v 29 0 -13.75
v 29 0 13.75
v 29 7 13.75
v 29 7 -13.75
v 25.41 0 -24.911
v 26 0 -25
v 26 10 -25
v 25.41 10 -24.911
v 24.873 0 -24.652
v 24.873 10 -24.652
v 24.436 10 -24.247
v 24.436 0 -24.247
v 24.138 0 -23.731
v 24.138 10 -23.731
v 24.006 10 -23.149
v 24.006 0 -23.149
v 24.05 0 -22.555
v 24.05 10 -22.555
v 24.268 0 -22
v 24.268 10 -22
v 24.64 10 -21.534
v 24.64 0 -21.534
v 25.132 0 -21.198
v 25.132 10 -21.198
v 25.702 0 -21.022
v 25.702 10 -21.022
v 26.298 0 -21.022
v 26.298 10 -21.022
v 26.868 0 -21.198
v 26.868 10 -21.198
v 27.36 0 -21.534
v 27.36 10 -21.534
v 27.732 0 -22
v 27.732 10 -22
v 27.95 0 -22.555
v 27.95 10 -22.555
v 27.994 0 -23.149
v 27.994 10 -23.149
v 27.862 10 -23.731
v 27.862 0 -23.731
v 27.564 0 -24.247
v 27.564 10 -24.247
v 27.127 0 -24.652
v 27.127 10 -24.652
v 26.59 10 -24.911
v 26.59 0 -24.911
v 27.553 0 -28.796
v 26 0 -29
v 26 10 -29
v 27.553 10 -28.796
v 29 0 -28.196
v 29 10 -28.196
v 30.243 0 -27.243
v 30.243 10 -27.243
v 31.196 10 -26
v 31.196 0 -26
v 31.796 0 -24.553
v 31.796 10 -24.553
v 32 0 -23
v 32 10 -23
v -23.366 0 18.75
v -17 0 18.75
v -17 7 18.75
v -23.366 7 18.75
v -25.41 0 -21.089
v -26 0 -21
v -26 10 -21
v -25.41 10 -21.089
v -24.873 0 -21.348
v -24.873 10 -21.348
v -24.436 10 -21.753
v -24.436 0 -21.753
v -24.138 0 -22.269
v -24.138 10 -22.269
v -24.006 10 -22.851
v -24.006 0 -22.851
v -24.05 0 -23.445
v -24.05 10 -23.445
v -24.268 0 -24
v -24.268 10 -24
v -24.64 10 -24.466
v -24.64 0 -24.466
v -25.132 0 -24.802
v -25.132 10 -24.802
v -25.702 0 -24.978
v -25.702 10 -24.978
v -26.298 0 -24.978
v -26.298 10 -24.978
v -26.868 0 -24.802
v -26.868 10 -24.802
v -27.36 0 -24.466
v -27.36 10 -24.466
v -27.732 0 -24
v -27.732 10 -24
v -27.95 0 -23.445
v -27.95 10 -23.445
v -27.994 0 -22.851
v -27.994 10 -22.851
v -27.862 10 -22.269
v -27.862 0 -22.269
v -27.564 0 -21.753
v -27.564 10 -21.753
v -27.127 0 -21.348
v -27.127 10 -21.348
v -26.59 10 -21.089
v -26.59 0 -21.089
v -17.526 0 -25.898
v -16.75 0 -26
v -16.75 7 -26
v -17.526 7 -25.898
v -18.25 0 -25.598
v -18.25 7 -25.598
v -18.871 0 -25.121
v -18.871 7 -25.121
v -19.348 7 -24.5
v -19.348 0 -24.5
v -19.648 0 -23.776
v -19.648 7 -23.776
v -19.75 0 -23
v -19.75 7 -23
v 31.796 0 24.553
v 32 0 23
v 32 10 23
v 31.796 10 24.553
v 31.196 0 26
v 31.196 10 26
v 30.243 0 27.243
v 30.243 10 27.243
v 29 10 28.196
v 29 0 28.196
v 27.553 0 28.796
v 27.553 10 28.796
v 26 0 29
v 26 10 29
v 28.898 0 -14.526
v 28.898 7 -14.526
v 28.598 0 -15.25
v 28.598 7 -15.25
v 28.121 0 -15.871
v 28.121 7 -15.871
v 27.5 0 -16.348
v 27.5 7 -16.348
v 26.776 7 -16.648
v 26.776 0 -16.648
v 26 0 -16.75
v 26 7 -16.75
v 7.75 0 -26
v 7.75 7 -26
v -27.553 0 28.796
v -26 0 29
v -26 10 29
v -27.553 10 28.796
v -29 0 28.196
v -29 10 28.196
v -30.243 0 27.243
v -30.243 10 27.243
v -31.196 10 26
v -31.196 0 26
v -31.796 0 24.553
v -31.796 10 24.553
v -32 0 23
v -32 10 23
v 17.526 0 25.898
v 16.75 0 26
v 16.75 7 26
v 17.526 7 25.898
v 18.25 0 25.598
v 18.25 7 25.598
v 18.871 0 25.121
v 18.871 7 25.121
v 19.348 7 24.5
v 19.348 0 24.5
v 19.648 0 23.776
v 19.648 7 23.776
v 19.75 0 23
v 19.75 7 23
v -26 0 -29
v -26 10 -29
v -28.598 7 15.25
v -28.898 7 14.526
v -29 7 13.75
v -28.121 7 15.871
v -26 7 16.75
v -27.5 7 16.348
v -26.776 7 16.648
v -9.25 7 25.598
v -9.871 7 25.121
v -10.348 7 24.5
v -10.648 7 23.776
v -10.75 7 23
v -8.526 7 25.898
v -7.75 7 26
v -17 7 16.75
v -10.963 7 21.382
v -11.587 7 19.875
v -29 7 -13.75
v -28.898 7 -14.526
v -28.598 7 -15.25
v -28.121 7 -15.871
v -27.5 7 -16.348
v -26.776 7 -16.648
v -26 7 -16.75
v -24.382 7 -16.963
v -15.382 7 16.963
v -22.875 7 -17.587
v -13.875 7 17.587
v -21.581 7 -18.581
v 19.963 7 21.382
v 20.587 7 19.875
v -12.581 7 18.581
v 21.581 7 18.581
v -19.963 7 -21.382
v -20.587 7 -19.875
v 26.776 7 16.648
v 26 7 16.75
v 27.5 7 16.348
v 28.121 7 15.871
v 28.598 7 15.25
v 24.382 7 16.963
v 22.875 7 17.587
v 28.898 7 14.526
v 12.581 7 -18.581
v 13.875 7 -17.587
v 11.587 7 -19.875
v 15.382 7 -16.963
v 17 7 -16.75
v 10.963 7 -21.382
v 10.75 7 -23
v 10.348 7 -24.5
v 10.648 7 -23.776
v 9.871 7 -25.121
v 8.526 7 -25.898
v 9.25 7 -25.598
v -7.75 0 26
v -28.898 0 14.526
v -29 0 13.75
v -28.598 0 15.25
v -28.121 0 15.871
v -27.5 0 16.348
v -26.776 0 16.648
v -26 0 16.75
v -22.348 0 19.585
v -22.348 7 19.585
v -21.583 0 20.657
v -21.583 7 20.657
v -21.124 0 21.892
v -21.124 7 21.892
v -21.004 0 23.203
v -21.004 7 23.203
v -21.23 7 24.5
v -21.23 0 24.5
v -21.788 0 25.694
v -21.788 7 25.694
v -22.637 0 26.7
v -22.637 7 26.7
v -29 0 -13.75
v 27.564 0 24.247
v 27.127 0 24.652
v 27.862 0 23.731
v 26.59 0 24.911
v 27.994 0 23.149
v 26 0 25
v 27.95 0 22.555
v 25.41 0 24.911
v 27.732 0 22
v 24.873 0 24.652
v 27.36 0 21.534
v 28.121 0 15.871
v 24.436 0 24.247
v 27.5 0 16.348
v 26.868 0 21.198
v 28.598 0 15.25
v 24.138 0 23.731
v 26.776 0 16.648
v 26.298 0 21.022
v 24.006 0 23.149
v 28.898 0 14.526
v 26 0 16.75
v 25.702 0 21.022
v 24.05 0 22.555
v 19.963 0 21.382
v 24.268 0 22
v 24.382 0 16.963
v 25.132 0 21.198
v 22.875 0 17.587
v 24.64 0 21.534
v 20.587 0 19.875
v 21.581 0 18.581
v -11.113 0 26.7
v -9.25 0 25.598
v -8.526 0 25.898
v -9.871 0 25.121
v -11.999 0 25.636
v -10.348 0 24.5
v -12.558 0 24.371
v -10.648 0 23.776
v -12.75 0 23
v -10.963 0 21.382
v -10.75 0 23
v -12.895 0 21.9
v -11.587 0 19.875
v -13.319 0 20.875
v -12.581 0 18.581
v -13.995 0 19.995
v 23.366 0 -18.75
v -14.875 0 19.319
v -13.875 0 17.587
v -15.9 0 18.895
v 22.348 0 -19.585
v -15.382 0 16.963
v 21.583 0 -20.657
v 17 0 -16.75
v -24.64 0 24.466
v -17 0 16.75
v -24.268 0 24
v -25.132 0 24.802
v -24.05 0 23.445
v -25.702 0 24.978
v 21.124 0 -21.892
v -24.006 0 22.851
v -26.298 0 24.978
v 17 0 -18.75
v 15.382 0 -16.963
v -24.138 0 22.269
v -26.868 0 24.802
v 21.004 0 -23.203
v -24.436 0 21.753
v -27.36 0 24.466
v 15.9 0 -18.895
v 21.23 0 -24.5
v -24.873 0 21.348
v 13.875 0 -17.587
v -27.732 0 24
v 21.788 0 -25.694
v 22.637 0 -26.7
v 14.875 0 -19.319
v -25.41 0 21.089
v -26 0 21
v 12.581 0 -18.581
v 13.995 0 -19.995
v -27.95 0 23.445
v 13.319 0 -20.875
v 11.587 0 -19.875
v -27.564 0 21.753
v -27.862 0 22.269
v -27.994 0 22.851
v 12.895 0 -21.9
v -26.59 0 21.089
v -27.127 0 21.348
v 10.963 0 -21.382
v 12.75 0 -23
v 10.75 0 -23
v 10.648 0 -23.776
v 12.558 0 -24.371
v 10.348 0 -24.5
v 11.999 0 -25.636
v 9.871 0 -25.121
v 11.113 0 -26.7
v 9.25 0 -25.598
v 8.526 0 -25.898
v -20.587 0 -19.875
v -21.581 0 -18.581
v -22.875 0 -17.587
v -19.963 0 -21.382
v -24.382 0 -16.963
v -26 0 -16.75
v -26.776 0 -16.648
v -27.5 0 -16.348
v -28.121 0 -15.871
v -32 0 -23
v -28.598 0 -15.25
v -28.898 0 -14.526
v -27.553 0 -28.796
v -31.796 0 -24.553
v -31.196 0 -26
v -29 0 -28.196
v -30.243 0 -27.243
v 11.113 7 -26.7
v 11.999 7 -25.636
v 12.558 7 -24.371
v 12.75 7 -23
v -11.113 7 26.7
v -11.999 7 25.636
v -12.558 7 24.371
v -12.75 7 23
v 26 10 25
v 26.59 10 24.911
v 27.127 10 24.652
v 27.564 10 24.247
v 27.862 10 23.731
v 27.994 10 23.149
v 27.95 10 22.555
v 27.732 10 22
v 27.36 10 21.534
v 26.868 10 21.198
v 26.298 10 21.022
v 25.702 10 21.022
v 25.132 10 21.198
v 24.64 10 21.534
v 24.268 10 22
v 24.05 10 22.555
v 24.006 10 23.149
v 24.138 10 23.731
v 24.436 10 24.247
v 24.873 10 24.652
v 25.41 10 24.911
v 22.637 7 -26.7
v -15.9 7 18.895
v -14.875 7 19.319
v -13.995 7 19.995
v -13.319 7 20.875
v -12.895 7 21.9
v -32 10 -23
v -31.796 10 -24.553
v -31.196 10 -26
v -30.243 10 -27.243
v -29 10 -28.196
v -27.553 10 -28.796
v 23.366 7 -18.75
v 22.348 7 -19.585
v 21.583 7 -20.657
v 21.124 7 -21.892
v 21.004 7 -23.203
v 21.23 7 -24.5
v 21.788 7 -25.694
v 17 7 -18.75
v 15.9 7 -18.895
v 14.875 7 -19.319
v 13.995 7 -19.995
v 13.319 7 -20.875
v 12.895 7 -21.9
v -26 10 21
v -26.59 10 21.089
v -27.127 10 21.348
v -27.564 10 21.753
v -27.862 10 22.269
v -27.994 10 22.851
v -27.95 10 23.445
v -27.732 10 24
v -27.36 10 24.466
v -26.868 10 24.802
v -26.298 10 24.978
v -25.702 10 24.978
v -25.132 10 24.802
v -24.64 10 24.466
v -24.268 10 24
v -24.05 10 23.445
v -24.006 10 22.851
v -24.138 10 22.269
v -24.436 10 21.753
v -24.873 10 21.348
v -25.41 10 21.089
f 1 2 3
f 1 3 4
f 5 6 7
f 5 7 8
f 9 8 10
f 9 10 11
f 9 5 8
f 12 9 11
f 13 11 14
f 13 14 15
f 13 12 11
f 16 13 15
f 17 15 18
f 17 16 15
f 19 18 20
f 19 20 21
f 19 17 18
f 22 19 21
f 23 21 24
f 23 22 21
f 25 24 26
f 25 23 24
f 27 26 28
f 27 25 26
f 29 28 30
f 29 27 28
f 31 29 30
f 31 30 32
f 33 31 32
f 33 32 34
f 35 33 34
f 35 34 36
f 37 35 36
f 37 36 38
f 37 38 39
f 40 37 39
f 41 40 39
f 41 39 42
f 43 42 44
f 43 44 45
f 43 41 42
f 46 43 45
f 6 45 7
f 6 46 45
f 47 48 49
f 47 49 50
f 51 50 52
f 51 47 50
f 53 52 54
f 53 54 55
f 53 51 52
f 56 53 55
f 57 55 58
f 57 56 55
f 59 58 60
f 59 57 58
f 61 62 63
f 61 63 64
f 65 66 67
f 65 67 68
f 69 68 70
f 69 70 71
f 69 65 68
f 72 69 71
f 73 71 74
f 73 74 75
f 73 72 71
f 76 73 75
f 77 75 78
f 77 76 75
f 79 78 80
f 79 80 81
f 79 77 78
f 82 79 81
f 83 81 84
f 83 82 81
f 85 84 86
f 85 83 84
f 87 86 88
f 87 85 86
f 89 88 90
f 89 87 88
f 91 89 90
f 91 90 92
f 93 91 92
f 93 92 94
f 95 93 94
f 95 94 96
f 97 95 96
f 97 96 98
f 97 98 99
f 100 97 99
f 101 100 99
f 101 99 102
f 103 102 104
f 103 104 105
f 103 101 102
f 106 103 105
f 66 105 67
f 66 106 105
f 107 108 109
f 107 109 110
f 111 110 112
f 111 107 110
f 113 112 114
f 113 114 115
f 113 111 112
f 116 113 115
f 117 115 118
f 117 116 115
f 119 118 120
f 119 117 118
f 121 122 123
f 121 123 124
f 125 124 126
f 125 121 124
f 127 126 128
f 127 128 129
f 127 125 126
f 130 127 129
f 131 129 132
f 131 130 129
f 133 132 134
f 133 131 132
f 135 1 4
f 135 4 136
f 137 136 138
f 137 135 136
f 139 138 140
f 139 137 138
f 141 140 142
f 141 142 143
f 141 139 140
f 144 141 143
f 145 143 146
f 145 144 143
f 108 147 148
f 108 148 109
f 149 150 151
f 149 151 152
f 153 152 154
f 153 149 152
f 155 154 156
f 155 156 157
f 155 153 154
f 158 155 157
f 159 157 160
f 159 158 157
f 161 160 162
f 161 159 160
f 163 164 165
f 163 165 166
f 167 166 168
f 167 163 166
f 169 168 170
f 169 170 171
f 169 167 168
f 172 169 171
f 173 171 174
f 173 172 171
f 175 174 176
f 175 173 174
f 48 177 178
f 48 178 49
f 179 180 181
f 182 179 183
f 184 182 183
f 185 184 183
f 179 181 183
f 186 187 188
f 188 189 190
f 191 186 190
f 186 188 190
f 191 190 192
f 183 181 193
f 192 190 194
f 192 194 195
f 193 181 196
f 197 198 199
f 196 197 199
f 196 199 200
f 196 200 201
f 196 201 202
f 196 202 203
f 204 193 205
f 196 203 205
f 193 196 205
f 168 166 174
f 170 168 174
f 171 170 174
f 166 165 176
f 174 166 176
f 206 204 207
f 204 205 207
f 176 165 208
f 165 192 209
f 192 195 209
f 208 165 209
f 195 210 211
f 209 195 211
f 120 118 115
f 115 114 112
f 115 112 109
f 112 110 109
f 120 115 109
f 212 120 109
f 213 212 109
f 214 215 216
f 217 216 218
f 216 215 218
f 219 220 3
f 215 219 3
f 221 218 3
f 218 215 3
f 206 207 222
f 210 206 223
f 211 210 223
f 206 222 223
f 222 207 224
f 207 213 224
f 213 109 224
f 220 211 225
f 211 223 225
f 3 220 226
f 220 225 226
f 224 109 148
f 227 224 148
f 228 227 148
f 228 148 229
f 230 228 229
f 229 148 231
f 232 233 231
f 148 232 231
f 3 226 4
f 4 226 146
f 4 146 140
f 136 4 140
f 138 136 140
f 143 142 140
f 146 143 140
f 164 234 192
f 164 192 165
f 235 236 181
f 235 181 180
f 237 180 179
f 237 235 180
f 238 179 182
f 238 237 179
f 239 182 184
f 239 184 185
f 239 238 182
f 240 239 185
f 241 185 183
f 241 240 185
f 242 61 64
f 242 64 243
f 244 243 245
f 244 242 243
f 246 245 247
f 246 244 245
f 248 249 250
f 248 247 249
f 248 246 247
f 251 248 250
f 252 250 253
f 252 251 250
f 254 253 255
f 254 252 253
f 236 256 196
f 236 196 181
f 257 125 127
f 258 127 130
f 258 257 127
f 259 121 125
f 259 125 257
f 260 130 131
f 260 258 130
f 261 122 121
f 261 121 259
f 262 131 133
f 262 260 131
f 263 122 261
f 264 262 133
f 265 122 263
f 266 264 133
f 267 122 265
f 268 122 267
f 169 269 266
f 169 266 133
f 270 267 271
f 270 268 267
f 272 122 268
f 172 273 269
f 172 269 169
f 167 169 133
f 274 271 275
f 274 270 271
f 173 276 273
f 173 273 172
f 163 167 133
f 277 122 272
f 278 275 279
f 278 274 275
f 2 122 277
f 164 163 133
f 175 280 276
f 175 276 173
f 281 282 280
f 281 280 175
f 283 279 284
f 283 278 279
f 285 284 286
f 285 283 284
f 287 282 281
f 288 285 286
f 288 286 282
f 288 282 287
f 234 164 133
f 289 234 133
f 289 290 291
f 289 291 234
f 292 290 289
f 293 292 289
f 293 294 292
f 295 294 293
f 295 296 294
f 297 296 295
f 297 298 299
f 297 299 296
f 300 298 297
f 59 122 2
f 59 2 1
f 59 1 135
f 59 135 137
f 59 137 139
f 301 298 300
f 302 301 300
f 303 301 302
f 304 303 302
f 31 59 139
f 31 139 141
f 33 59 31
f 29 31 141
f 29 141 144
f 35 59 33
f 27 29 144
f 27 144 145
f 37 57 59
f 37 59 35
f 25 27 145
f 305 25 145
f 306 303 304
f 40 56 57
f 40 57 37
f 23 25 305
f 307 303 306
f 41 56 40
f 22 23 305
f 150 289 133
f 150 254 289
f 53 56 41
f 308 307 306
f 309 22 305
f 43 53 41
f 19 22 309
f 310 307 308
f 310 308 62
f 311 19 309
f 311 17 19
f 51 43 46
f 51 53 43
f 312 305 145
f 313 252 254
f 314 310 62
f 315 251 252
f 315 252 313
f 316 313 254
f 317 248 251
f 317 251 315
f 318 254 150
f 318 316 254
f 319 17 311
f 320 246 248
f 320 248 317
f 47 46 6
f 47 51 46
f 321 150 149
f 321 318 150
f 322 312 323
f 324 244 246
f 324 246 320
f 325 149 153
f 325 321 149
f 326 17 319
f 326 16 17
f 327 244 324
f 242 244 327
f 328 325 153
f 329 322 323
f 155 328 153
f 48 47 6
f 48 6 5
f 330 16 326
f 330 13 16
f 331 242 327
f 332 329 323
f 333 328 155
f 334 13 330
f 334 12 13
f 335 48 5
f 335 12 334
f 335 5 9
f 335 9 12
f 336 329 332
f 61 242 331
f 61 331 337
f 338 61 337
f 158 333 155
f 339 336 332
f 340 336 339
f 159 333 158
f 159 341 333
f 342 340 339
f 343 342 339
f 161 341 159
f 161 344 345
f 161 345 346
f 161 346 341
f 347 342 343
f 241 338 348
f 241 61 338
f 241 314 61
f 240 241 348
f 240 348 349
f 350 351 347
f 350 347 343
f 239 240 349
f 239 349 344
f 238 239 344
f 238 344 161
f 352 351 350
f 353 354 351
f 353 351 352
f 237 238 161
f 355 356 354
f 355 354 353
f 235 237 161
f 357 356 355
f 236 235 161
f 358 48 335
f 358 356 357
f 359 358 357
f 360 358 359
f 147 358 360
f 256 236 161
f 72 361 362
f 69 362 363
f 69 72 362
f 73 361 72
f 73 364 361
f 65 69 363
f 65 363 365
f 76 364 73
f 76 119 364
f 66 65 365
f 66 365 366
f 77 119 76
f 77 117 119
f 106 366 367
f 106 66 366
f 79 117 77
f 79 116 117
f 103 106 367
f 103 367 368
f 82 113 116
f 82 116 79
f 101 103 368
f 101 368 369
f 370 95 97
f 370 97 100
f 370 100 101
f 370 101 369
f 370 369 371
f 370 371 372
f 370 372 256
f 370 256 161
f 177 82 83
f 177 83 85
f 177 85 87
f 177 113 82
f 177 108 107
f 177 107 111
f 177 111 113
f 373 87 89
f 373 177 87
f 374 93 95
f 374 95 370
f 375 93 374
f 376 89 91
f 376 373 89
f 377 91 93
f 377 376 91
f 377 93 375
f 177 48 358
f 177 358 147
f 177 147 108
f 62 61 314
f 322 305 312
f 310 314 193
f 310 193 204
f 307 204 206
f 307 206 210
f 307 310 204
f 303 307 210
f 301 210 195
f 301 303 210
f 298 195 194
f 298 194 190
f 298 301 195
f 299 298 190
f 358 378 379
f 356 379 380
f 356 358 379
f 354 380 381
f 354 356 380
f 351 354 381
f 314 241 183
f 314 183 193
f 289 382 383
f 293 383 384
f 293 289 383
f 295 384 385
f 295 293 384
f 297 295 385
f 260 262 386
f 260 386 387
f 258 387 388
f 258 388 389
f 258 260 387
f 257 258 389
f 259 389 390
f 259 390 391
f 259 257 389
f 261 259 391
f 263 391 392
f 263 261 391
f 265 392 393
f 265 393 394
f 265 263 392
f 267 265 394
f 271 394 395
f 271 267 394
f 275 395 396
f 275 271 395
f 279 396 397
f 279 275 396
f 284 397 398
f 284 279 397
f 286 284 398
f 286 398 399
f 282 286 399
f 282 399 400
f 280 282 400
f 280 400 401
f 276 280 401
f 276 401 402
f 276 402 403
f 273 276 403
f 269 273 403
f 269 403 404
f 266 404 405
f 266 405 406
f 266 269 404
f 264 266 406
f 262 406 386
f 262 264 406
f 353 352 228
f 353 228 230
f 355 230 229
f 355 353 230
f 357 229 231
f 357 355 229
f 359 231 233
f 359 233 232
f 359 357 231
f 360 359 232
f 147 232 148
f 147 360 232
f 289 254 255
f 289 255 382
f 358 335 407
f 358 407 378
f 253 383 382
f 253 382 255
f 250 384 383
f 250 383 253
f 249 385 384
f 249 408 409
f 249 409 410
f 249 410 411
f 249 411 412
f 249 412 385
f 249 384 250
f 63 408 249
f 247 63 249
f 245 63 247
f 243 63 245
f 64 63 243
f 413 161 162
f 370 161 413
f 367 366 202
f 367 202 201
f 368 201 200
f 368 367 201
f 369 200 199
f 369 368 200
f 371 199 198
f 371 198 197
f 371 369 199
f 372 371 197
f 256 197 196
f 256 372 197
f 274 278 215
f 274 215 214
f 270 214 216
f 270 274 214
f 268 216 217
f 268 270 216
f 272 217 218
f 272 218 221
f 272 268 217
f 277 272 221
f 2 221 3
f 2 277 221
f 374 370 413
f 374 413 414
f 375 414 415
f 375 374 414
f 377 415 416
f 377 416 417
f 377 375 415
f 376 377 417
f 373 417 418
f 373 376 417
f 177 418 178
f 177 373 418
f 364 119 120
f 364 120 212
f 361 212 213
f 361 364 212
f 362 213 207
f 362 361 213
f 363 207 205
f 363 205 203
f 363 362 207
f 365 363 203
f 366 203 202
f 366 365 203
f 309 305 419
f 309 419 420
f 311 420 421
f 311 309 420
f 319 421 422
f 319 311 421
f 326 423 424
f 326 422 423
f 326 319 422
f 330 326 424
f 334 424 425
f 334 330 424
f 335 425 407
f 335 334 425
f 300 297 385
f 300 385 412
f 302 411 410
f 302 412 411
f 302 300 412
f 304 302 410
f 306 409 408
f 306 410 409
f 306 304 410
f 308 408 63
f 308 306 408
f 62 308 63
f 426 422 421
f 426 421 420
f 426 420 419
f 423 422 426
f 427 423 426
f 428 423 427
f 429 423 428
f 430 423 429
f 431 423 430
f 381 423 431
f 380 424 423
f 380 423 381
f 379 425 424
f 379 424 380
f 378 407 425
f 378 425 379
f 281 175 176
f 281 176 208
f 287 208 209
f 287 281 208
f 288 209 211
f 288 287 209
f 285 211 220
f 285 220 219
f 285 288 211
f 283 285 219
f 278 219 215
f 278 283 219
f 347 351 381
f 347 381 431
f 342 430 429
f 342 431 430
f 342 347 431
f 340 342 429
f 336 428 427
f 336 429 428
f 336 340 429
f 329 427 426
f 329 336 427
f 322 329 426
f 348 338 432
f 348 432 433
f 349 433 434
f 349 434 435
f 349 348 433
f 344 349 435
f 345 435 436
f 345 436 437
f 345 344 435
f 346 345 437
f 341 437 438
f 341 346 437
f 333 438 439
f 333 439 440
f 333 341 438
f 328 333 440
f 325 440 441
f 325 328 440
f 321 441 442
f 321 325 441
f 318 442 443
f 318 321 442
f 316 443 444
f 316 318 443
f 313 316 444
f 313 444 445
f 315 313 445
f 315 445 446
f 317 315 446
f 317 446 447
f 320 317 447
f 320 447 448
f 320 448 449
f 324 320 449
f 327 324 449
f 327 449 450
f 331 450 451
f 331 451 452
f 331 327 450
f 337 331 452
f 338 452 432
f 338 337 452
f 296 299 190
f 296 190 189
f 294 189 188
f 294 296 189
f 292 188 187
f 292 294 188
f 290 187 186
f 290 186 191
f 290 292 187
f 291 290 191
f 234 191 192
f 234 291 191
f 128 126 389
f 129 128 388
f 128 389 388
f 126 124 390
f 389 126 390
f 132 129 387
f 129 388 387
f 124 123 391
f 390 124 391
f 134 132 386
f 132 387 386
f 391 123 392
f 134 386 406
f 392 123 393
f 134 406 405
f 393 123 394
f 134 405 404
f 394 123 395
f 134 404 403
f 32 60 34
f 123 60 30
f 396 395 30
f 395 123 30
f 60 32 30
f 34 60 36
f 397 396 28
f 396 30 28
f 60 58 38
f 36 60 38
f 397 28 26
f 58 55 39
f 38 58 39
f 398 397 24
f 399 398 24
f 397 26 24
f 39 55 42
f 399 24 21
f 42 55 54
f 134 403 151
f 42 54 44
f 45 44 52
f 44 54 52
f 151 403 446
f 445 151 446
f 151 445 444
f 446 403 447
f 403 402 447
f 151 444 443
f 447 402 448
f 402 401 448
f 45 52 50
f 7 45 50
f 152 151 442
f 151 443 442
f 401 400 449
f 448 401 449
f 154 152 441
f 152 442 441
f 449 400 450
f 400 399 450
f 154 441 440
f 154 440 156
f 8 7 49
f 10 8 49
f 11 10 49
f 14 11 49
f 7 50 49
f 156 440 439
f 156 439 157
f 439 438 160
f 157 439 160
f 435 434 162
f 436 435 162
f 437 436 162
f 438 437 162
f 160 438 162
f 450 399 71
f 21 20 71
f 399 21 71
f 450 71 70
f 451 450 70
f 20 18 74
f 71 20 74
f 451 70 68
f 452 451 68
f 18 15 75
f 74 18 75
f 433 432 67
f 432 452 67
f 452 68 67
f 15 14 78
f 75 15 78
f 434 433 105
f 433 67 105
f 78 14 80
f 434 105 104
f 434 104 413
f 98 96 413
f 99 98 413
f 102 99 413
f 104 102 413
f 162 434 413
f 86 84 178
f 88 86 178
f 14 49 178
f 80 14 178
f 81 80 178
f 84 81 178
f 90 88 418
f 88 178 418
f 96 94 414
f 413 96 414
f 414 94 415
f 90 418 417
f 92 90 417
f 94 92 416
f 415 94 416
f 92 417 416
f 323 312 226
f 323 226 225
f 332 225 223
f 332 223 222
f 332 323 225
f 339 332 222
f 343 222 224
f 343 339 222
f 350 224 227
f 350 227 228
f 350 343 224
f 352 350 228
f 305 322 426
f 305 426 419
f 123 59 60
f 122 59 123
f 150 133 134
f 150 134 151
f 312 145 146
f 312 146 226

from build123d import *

# Parameters (mm, degrees)
SKETCH_1_R      = 2
EXTRUDE_1_DEPTH = 10
EXTRUDE_START   = 7
EXTRUDE_3_DEPTH = 3


with BuildPart() as part:
    # Эскиз1 → Бобышка-Вытянуть1 (new body)
    with BuildSketch(Plane(origin=(0, 0, 0), x_dir=(1, 0, 0), z_dir=(0, 1, 0))):
        with BuildLine():
            Line((-26, 29), (26, 29))
            ThreePointArc((26, 29), (30.242640687, 27.242640687), (32, 23))
            Line((32, 23), (32, -23))
            ThreePointArc((32, -23), (30.242640687, -27.242640687), (26, -29))
            Line((26, -29), (-26, -29))
            ThreePointArc((-26, -29), (-30.242640687, -27.242640687), (-32, -23))
            Line((-32, -23), (-32, 23))
            ThreePointArc((-32, 23), (-30.242640687, 27.242640687), (-26, 29))
        make_face()
        with Locations(Location((-26, 23, 0), (0, 0, 270))):
            Circle(SKETCH_1_R, mode=Mode.SUBTRACT)
        with Locations(Location((26, 23, 0), (0, 0, 90))):
            Circle(SKETCH_1_R, mode=Mode.SUBTRACT)
        with Locations(Location((26, -23, 0), (0, 0, 270))):
            Circle(SKETCH_1_R, mode=Mode.SUBTRACT)
        with Locations(Location((-26, -23, 0), (0, 0, 90))):
            Circle(SKETCH_1_R, mode=Mode.SUBTRACT)
        with BuildLine():
            Line((7.75, 26), (-16.75, 26))
            ThreePointArc((-16.75, 26), (-18.871320344, 25.121320344), (-19.75, 23))
            ThreePointArc((-19.75, 23), (-21.580582618, 18.580582618), (-26, 16.75))
            ThreePointArc((-26, 16.75), (-28.121320344, 15.871320344), (-29, 13.75))
            Line((-29, 13.75), (-29, -13.75))
            ThreePointArc((-29, -13.75), (-28.121320344, -15.871320344), (-26, -16.75))
            Line((-26, -16.75), (-17, -16.75))
            ThreePointArc((-17, -16.75), (-12.580582618, -18.580582618), (-10.75, -23))
            ThreePointArc((-10.75, -23), (-9.871320344, -25.121320344), (-7.75, -26))
            Line((-7.75, -26), (16.75, -26))
            ThreePointArc((16.75, -26), (18.871320344, -25.121320344), (19.75, -23))
            ThreePointArc((19.75, -23), (21.580582618, -18.580582618), (26, -16.75))
            ThreePointArc((26, -16.75), (28.121320344, -15.871320344), (29, -13.75))
            Line((29, -13.75), (29, 13.75))
            ThreePointArc((29, 13.75), (28.121320344, 15.871320344), (26, 16.75))
            Line((26, 16.75), (17, 16.75))
            ThreePointArc((17, 16.75), (12.580582618, 18.580582618), (10.75, 23))
            ThreePointArc((10.75, 23), (9.871320344, 25.121320344), (7.75, 26))
        make_face(mode=Mode.SUBTRACT)
        with BuildLine():
            Line((17, 18.75), (23.366086562, 18.75))
            ThreePointArc((23.366086562, 18.75), (21.020896599, 22.543349889), (22.636965656, 26.7))
            Line((22.636965656, 26.7), (11.113034344, 26.7))
            ThreePointArc((11.113034344, 26.7), (12.322481368, 25.022971611), (12.75, 23))
            ThreePointArc((12.75, 23), (13.99479618, 19.99479618), (17, 18.75))
        make_face(mode=Mode.SUBTRACT)
        with BuildLine():
            Line((-22.636965656, -26.7), (-11.113034344, -26.7))
            ThreePointArc((-11.113034344, -26.7), (-12.322481368, -25.022971611), (-12.75, -23))
            ThreePointArc((-12.75, -23), (-13.99479618, -19.99479618), (-17, -18.75))
            Line((-17, -18.75), (-23.366086562, -18.75))
            ThreePointArc((-23.366086562, -18.75), (-21.020896599, -22.543349889), (-22.636965656, -26.7))
        make_face(mode=Mode.SUBTRACT)
    extrude(amount=EXTRUDE_1_DEPTH)

    # Эскиз1<15> → Бобышка-Вытянуть3 (add)
    with BuildSketch(Plane(origin=(0, 0, 0), x_dir=(1, 0, 0), z_dir=(0, 1, 0)).offset(EXTRUDE_START)):
        with BuildLine():
            ThreePointArc((-17, -16.75), (-12.580582618, -18.580582618), (-10.75, -23))
            ThreePointArc((-10.75, -23), (-9.871320344, -25.121320344), (-7.75, -26))
            Line((-7.75, -26), (16.75, -26))
            ThreePointArc((16.75, -26), (18.871320344, -25.121320344), (19.75, -23))
            ThreePointArc((19.75, -23), (21.580582618, -18.580582618), (26, -16.75))
            ThreePointArc((26, -16.75), (28.121320344, -15.871320344), (29, -13.75))
            Line((29, -13.75), (29, 13.75))
            ThreePointArc((29, 13.75), (28.121320344, 15.871320344), (26, 16.75))
            Line((26, 16.75), (17, 16.75))
            ThreePointArc((17, 16.75), (12.580582618, 18.580582618), (10.75, 23))
            ThreePointArc((10.75, 23), (9.871320344, 25.121320344), (7.75, 26))
            Line((7.75, 26), (-16.75, 26))
            ThreePointArc((-16.75, 26), (-18.871320344, 25.121320344), (-19.75, 23))
            ThreePointArc((-19.75, 23), (-21.580582618, 18.580582618), (-26, 16.75))
            ThreePointArc((-26, 16.75), (-28.121320344, 15.871320344), (-29, 13.75))
            Line((-29, 13.75), (-29, -13.75))
            ThreePointArc((-29, -13.75), (-28.121320344, -15.871320344), (-26, -16.75))
            Line((-26, -16.75), (-17, -16.75))
        make_face()
        with BuildLine():
            ThreePointArc((12.75, 23), (12.322481368, 25.022971611), (11.113034344, 26.7))
            Line((11.113034344, 26.7), (22.636965656, 26.7))
            ThreePointArc((22.636965656, 26.7), (21.020896599, 22.543349889), (23.366086562, 18.75))
            Line((23.366086562, 18.75), (17, 18.75))
            ThreePointArc((17, 18.75), (13.99479618, 19.99479618), (12.75, 23))
        make_face()
        with BuildLine():
            ThreePointArc((-12.75, -23), (-12.322481368, -25.022971611), (-11.113034344, -26.7))
            Line((-11.113034344, -26.7), (-22.636965656, -26.7))
            ThreePointArc((-22.636965656, -26.7), (-21.020896599, -22.543349889), (-23.366086562, -18.75))
            Line((-23.366086562, -18.75), (-17, -18.75))
            ThreePointArc((-17, -18.75), (-13.99479618, -19.99479618), (-12.75, -23))
        make_face()
    extrude(amount=EXTRUDE_3_DEPTH)


solid = part.part
